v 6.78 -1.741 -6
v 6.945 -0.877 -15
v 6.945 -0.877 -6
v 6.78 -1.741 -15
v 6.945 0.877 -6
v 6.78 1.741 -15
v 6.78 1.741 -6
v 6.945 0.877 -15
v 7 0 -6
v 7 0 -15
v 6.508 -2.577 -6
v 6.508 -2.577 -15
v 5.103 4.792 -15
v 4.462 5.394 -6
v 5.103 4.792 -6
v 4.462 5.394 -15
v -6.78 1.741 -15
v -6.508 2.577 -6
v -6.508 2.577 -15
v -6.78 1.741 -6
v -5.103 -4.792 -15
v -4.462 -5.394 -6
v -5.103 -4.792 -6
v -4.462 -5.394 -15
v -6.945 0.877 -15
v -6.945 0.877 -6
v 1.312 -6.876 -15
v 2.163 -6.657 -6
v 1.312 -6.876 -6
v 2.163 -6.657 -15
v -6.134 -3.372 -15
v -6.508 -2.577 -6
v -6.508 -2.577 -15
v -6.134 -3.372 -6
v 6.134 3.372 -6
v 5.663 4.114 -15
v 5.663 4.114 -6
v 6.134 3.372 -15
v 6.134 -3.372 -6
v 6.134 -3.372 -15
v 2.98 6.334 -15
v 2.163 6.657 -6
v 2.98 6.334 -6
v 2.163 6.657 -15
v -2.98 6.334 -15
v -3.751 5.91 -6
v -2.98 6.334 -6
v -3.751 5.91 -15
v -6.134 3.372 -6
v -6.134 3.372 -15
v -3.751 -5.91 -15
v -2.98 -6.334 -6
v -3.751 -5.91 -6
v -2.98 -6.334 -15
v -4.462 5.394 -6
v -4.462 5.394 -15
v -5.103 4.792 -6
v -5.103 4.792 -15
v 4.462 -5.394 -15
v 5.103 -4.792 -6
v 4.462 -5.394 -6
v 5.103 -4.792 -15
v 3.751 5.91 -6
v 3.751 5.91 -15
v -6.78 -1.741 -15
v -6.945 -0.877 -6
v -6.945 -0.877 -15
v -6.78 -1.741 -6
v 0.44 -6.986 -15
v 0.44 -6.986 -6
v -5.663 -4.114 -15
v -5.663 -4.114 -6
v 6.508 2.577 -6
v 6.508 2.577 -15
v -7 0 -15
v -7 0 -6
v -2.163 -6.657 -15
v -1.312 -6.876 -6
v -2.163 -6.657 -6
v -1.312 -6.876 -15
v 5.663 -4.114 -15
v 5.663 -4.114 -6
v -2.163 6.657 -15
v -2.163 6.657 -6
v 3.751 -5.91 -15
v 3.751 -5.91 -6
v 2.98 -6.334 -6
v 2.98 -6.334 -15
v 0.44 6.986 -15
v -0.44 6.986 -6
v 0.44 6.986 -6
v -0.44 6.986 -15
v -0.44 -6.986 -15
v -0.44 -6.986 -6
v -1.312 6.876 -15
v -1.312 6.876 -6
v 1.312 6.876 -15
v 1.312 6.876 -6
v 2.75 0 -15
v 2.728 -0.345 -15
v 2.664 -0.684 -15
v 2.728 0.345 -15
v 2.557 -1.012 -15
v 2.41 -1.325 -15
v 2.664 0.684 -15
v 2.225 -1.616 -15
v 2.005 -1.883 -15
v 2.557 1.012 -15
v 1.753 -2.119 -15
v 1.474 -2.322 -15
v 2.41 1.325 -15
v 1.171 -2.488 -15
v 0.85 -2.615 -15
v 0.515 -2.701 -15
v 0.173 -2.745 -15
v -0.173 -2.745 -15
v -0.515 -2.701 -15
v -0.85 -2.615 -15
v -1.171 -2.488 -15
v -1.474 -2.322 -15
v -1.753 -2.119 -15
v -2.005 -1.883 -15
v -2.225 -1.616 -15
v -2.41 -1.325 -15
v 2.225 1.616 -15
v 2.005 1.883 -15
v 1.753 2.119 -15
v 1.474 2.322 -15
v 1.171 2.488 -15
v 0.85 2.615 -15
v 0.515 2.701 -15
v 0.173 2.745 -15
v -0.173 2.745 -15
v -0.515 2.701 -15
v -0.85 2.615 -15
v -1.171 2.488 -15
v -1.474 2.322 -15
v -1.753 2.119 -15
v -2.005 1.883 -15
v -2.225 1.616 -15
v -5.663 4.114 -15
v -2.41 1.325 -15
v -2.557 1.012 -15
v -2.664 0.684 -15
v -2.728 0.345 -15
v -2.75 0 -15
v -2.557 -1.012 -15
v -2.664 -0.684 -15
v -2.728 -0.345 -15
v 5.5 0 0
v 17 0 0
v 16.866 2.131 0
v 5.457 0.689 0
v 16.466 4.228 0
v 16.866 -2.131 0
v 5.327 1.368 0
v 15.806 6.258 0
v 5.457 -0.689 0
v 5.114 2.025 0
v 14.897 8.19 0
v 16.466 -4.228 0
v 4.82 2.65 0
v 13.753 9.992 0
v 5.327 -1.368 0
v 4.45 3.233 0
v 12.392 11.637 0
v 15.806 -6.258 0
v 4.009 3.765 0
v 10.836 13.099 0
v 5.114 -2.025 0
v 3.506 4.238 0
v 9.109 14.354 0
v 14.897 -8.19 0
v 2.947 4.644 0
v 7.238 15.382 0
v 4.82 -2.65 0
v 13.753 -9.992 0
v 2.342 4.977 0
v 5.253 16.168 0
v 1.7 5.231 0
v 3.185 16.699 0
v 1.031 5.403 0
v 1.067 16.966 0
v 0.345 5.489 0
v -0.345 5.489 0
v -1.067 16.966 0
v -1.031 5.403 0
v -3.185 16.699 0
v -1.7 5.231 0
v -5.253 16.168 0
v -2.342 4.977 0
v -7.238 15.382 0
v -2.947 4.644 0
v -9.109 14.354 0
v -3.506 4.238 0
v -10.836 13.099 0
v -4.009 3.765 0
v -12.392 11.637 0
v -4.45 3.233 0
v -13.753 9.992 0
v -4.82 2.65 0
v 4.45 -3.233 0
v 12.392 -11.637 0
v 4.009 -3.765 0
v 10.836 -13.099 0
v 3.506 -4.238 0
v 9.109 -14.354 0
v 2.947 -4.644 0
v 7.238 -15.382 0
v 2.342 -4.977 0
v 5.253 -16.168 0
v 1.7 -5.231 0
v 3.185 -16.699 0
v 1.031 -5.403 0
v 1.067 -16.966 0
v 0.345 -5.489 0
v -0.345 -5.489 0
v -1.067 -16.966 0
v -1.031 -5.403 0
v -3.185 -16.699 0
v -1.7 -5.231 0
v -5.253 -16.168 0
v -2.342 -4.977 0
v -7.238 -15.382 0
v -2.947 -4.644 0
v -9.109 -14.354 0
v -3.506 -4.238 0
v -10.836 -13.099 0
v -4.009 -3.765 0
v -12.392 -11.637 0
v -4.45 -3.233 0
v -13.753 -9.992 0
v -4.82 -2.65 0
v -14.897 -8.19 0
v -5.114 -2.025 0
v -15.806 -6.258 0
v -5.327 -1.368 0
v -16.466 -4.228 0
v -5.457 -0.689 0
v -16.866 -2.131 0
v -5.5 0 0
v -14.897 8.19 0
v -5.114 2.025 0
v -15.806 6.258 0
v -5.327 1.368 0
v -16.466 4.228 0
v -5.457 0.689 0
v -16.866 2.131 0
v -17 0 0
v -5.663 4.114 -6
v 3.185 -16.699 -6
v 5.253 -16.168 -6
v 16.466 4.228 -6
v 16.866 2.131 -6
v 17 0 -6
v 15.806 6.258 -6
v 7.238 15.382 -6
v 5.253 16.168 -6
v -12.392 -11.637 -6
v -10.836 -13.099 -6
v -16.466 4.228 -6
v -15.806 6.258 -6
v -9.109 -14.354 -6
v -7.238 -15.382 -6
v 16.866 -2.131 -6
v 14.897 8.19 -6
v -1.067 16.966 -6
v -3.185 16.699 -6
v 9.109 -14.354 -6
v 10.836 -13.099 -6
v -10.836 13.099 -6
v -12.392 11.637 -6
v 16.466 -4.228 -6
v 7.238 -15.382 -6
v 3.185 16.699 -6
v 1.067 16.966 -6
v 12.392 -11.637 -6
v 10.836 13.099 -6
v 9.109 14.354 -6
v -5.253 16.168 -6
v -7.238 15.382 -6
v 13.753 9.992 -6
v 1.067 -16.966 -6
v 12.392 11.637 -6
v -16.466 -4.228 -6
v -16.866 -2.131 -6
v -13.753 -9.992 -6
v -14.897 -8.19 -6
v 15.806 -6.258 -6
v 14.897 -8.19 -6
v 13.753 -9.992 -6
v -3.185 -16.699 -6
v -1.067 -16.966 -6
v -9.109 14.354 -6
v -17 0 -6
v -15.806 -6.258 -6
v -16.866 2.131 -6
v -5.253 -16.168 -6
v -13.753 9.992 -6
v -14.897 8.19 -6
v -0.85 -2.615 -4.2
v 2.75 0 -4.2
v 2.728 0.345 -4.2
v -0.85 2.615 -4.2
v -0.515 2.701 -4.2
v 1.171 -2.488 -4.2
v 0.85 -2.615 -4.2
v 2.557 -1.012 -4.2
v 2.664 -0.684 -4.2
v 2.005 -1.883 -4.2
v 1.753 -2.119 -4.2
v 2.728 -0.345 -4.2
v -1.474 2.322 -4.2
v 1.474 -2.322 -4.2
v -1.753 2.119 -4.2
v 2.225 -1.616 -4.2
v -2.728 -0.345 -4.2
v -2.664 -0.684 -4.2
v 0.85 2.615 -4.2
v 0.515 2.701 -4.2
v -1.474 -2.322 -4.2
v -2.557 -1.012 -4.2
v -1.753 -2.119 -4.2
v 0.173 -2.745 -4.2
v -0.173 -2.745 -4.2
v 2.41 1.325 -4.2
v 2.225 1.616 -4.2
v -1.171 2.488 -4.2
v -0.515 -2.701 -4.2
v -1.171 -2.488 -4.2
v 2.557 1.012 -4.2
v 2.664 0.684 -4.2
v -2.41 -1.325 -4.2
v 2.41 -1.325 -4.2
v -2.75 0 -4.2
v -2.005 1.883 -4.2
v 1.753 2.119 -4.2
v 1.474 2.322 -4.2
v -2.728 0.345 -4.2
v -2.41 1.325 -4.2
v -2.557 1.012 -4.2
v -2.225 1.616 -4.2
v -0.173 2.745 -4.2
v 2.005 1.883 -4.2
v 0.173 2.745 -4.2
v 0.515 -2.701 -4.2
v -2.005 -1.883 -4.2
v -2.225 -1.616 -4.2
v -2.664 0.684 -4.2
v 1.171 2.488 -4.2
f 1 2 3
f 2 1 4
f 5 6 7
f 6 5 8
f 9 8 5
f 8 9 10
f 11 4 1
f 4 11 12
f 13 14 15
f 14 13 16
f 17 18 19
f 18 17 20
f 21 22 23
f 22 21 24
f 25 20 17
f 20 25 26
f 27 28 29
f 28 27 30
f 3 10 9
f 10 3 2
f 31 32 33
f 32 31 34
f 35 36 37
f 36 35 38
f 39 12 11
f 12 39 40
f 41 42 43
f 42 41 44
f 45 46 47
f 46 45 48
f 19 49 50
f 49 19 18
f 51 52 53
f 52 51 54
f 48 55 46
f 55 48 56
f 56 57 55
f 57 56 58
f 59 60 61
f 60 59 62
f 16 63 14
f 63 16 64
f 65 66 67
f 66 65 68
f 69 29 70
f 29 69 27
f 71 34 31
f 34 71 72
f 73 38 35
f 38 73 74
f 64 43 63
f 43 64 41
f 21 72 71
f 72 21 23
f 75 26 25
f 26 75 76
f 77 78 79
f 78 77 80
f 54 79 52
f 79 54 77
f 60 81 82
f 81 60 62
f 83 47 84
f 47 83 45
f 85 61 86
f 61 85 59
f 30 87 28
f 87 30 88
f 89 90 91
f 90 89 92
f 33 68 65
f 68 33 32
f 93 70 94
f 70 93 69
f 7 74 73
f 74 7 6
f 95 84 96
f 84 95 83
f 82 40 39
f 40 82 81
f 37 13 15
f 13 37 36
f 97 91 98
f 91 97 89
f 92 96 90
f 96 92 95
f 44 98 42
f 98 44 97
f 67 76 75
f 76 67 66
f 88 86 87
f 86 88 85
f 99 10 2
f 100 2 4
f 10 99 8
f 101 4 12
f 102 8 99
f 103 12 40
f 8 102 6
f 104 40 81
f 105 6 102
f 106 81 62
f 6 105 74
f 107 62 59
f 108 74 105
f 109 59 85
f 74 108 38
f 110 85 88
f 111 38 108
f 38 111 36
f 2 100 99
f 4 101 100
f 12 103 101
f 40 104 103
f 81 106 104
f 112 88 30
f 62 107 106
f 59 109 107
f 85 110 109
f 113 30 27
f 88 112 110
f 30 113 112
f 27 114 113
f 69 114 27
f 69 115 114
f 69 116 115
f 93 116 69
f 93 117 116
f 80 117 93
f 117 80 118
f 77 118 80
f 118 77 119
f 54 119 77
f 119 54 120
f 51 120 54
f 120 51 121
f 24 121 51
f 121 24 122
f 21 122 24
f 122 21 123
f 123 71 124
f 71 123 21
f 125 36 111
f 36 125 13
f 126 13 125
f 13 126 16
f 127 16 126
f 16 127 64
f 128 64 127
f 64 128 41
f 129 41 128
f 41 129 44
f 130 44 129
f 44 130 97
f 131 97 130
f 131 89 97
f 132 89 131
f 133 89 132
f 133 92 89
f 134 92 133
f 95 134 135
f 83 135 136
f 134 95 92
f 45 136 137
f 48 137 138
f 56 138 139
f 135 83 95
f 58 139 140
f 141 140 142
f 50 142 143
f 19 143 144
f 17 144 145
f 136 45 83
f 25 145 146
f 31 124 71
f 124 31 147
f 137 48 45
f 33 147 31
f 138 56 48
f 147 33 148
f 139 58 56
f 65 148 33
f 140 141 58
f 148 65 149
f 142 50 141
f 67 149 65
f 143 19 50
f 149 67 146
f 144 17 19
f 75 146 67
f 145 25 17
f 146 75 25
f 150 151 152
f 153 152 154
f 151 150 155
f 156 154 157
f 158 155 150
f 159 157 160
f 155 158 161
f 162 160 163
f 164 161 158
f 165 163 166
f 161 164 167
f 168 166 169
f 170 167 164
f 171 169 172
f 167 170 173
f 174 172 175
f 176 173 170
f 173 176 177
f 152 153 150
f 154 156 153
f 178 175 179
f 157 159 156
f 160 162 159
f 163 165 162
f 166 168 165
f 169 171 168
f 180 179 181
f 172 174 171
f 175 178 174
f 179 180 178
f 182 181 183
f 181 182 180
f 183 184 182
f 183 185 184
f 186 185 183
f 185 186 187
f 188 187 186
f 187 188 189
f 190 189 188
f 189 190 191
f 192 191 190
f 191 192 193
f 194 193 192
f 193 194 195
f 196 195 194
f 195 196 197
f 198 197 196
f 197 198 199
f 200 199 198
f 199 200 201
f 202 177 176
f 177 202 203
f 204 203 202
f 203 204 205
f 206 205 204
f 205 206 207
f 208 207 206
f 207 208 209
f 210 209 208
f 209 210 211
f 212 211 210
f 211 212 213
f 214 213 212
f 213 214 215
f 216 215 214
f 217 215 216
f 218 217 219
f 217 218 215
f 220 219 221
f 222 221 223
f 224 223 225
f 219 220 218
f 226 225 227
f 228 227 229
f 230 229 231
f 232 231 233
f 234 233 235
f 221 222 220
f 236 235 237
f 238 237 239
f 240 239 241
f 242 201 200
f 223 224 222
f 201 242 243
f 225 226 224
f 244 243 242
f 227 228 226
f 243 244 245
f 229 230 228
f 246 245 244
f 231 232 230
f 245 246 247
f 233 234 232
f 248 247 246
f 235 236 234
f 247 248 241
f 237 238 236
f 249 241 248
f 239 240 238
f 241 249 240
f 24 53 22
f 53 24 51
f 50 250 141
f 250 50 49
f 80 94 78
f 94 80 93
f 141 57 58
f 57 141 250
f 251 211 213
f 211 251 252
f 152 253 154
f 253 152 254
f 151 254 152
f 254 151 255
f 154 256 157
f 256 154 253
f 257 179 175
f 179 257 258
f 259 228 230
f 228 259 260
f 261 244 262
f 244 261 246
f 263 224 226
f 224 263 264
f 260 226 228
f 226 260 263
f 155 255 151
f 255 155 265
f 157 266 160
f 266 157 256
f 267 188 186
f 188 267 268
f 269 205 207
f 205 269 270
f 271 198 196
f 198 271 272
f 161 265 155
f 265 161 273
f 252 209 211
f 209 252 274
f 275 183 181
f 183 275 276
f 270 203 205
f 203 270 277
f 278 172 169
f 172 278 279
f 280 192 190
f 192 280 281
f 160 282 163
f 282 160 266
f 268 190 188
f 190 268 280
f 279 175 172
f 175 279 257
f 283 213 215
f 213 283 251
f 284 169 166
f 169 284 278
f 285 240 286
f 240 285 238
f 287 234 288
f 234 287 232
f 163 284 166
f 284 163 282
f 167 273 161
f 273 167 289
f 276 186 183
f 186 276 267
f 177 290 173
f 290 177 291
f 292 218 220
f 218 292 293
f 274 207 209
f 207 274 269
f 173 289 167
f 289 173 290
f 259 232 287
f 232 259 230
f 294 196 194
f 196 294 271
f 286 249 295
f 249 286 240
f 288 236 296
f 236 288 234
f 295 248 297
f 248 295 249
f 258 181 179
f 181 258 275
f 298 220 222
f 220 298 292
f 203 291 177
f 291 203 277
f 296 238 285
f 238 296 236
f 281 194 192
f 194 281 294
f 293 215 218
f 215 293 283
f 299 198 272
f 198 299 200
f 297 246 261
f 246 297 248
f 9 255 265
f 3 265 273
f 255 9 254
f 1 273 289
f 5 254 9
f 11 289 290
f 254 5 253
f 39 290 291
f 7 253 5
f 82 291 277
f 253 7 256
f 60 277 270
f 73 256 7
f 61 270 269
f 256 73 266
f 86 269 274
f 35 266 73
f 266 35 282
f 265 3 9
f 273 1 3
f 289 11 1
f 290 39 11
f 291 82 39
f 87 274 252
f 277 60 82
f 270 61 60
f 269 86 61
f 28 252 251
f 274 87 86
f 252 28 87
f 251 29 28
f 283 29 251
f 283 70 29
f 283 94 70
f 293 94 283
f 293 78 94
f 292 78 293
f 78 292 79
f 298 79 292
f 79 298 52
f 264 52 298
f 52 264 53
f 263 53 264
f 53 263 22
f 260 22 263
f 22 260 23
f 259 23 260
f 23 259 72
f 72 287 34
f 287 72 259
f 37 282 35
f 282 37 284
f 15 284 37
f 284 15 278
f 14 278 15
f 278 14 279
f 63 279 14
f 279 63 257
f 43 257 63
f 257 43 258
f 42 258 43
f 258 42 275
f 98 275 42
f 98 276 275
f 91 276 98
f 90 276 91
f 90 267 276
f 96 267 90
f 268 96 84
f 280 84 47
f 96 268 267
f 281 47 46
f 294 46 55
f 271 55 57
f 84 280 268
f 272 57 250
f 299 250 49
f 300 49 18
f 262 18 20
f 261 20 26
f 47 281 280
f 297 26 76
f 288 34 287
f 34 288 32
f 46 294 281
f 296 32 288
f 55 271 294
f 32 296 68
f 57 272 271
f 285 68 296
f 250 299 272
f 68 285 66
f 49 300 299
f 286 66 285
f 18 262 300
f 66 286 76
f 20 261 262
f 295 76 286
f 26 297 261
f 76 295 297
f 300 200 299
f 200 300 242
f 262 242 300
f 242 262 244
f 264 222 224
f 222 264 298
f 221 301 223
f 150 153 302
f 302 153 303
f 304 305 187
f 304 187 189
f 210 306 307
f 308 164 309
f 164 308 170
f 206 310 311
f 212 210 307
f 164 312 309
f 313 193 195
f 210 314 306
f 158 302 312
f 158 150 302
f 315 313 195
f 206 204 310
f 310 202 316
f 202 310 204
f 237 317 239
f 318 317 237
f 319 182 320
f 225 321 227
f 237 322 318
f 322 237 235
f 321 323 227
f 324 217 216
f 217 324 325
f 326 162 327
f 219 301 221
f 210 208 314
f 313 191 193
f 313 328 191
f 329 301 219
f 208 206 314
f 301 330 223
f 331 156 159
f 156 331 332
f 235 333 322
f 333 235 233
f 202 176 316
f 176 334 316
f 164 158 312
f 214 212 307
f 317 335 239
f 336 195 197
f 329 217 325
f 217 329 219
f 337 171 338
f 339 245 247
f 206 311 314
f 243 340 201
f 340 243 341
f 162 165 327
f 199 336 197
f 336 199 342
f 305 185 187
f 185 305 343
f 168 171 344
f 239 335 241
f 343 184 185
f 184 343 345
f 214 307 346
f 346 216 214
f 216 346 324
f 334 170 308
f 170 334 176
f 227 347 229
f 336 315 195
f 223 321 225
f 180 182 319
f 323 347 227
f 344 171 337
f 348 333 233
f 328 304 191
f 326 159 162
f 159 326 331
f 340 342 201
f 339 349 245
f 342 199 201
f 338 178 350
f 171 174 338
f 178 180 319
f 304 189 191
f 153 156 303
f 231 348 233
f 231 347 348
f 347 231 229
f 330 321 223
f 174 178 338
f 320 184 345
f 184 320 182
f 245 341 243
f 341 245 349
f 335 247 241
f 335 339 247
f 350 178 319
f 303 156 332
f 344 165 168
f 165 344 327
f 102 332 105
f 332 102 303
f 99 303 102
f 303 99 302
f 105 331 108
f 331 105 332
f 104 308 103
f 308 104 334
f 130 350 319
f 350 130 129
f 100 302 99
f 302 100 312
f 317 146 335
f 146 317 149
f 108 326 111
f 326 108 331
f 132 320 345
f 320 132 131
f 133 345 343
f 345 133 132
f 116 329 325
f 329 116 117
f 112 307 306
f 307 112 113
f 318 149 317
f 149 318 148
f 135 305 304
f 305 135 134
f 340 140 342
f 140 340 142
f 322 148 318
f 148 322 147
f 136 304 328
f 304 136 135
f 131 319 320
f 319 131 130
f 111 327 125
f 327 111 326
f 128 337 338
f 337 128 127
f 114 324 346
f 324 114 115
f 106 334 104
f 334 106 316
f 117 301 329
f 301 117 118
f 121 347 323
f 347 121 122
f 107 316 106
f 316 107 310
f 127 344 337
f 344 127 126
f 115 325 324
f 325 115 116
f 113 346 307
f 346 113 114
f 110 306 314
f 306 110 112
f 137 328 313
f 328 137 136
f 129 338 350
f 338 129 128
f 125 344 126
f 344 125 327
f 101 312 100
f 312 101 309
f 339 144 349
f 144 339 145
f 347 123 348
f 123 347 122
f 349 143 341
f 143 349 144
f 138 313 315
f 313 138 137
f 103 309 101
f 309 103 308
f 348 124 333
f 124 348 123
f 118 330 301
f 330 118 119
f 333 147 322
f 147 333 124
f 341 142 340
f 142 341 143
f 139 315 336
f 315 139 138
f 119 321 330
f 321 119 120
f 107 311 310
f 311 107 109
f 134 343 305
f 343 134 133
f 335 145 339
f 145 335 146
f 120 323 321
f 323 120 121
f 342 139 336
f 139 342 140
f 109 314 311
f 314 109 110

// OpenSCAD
$fn = 50;


difference() {
	union() {
		translate(v = [0, 0, -15.0000000000]) {
			cylinder(h = 15, r = 7.0000000000);
		}
		translate(v = [0, 0, -6.0000000000]) {
			cylinder(h = 6, r = 17.0000000000);
		}
	}
	union() {
		translate(v = [0, 0, 0]) {
			rotate(a = [0, 0, 0]) {
				difference() {
					union() {
						#translate(v = [0, 0, -15.0000000000]) {
							cylinder(h = 15, r = 2.2500000000);
						}
						#translate(v = [0, 0, -4.2000000000]) {
							cylinder(h = 4.2000000000, r = 7.0000000000, r1 = 2.7500000000, r2 = 5.5000000000);
						}
						#translate(v = [0, 0, -15.0000000000]) {
							cylinder(h = 15, r = 2.7500000000);
						}
						#translate(v = [0, 0, -15.0000000000]) {
							cylinder(h = 15, r = 2.2500000000);
						}
					}
					union();
				}
			}
		}
	}
}
